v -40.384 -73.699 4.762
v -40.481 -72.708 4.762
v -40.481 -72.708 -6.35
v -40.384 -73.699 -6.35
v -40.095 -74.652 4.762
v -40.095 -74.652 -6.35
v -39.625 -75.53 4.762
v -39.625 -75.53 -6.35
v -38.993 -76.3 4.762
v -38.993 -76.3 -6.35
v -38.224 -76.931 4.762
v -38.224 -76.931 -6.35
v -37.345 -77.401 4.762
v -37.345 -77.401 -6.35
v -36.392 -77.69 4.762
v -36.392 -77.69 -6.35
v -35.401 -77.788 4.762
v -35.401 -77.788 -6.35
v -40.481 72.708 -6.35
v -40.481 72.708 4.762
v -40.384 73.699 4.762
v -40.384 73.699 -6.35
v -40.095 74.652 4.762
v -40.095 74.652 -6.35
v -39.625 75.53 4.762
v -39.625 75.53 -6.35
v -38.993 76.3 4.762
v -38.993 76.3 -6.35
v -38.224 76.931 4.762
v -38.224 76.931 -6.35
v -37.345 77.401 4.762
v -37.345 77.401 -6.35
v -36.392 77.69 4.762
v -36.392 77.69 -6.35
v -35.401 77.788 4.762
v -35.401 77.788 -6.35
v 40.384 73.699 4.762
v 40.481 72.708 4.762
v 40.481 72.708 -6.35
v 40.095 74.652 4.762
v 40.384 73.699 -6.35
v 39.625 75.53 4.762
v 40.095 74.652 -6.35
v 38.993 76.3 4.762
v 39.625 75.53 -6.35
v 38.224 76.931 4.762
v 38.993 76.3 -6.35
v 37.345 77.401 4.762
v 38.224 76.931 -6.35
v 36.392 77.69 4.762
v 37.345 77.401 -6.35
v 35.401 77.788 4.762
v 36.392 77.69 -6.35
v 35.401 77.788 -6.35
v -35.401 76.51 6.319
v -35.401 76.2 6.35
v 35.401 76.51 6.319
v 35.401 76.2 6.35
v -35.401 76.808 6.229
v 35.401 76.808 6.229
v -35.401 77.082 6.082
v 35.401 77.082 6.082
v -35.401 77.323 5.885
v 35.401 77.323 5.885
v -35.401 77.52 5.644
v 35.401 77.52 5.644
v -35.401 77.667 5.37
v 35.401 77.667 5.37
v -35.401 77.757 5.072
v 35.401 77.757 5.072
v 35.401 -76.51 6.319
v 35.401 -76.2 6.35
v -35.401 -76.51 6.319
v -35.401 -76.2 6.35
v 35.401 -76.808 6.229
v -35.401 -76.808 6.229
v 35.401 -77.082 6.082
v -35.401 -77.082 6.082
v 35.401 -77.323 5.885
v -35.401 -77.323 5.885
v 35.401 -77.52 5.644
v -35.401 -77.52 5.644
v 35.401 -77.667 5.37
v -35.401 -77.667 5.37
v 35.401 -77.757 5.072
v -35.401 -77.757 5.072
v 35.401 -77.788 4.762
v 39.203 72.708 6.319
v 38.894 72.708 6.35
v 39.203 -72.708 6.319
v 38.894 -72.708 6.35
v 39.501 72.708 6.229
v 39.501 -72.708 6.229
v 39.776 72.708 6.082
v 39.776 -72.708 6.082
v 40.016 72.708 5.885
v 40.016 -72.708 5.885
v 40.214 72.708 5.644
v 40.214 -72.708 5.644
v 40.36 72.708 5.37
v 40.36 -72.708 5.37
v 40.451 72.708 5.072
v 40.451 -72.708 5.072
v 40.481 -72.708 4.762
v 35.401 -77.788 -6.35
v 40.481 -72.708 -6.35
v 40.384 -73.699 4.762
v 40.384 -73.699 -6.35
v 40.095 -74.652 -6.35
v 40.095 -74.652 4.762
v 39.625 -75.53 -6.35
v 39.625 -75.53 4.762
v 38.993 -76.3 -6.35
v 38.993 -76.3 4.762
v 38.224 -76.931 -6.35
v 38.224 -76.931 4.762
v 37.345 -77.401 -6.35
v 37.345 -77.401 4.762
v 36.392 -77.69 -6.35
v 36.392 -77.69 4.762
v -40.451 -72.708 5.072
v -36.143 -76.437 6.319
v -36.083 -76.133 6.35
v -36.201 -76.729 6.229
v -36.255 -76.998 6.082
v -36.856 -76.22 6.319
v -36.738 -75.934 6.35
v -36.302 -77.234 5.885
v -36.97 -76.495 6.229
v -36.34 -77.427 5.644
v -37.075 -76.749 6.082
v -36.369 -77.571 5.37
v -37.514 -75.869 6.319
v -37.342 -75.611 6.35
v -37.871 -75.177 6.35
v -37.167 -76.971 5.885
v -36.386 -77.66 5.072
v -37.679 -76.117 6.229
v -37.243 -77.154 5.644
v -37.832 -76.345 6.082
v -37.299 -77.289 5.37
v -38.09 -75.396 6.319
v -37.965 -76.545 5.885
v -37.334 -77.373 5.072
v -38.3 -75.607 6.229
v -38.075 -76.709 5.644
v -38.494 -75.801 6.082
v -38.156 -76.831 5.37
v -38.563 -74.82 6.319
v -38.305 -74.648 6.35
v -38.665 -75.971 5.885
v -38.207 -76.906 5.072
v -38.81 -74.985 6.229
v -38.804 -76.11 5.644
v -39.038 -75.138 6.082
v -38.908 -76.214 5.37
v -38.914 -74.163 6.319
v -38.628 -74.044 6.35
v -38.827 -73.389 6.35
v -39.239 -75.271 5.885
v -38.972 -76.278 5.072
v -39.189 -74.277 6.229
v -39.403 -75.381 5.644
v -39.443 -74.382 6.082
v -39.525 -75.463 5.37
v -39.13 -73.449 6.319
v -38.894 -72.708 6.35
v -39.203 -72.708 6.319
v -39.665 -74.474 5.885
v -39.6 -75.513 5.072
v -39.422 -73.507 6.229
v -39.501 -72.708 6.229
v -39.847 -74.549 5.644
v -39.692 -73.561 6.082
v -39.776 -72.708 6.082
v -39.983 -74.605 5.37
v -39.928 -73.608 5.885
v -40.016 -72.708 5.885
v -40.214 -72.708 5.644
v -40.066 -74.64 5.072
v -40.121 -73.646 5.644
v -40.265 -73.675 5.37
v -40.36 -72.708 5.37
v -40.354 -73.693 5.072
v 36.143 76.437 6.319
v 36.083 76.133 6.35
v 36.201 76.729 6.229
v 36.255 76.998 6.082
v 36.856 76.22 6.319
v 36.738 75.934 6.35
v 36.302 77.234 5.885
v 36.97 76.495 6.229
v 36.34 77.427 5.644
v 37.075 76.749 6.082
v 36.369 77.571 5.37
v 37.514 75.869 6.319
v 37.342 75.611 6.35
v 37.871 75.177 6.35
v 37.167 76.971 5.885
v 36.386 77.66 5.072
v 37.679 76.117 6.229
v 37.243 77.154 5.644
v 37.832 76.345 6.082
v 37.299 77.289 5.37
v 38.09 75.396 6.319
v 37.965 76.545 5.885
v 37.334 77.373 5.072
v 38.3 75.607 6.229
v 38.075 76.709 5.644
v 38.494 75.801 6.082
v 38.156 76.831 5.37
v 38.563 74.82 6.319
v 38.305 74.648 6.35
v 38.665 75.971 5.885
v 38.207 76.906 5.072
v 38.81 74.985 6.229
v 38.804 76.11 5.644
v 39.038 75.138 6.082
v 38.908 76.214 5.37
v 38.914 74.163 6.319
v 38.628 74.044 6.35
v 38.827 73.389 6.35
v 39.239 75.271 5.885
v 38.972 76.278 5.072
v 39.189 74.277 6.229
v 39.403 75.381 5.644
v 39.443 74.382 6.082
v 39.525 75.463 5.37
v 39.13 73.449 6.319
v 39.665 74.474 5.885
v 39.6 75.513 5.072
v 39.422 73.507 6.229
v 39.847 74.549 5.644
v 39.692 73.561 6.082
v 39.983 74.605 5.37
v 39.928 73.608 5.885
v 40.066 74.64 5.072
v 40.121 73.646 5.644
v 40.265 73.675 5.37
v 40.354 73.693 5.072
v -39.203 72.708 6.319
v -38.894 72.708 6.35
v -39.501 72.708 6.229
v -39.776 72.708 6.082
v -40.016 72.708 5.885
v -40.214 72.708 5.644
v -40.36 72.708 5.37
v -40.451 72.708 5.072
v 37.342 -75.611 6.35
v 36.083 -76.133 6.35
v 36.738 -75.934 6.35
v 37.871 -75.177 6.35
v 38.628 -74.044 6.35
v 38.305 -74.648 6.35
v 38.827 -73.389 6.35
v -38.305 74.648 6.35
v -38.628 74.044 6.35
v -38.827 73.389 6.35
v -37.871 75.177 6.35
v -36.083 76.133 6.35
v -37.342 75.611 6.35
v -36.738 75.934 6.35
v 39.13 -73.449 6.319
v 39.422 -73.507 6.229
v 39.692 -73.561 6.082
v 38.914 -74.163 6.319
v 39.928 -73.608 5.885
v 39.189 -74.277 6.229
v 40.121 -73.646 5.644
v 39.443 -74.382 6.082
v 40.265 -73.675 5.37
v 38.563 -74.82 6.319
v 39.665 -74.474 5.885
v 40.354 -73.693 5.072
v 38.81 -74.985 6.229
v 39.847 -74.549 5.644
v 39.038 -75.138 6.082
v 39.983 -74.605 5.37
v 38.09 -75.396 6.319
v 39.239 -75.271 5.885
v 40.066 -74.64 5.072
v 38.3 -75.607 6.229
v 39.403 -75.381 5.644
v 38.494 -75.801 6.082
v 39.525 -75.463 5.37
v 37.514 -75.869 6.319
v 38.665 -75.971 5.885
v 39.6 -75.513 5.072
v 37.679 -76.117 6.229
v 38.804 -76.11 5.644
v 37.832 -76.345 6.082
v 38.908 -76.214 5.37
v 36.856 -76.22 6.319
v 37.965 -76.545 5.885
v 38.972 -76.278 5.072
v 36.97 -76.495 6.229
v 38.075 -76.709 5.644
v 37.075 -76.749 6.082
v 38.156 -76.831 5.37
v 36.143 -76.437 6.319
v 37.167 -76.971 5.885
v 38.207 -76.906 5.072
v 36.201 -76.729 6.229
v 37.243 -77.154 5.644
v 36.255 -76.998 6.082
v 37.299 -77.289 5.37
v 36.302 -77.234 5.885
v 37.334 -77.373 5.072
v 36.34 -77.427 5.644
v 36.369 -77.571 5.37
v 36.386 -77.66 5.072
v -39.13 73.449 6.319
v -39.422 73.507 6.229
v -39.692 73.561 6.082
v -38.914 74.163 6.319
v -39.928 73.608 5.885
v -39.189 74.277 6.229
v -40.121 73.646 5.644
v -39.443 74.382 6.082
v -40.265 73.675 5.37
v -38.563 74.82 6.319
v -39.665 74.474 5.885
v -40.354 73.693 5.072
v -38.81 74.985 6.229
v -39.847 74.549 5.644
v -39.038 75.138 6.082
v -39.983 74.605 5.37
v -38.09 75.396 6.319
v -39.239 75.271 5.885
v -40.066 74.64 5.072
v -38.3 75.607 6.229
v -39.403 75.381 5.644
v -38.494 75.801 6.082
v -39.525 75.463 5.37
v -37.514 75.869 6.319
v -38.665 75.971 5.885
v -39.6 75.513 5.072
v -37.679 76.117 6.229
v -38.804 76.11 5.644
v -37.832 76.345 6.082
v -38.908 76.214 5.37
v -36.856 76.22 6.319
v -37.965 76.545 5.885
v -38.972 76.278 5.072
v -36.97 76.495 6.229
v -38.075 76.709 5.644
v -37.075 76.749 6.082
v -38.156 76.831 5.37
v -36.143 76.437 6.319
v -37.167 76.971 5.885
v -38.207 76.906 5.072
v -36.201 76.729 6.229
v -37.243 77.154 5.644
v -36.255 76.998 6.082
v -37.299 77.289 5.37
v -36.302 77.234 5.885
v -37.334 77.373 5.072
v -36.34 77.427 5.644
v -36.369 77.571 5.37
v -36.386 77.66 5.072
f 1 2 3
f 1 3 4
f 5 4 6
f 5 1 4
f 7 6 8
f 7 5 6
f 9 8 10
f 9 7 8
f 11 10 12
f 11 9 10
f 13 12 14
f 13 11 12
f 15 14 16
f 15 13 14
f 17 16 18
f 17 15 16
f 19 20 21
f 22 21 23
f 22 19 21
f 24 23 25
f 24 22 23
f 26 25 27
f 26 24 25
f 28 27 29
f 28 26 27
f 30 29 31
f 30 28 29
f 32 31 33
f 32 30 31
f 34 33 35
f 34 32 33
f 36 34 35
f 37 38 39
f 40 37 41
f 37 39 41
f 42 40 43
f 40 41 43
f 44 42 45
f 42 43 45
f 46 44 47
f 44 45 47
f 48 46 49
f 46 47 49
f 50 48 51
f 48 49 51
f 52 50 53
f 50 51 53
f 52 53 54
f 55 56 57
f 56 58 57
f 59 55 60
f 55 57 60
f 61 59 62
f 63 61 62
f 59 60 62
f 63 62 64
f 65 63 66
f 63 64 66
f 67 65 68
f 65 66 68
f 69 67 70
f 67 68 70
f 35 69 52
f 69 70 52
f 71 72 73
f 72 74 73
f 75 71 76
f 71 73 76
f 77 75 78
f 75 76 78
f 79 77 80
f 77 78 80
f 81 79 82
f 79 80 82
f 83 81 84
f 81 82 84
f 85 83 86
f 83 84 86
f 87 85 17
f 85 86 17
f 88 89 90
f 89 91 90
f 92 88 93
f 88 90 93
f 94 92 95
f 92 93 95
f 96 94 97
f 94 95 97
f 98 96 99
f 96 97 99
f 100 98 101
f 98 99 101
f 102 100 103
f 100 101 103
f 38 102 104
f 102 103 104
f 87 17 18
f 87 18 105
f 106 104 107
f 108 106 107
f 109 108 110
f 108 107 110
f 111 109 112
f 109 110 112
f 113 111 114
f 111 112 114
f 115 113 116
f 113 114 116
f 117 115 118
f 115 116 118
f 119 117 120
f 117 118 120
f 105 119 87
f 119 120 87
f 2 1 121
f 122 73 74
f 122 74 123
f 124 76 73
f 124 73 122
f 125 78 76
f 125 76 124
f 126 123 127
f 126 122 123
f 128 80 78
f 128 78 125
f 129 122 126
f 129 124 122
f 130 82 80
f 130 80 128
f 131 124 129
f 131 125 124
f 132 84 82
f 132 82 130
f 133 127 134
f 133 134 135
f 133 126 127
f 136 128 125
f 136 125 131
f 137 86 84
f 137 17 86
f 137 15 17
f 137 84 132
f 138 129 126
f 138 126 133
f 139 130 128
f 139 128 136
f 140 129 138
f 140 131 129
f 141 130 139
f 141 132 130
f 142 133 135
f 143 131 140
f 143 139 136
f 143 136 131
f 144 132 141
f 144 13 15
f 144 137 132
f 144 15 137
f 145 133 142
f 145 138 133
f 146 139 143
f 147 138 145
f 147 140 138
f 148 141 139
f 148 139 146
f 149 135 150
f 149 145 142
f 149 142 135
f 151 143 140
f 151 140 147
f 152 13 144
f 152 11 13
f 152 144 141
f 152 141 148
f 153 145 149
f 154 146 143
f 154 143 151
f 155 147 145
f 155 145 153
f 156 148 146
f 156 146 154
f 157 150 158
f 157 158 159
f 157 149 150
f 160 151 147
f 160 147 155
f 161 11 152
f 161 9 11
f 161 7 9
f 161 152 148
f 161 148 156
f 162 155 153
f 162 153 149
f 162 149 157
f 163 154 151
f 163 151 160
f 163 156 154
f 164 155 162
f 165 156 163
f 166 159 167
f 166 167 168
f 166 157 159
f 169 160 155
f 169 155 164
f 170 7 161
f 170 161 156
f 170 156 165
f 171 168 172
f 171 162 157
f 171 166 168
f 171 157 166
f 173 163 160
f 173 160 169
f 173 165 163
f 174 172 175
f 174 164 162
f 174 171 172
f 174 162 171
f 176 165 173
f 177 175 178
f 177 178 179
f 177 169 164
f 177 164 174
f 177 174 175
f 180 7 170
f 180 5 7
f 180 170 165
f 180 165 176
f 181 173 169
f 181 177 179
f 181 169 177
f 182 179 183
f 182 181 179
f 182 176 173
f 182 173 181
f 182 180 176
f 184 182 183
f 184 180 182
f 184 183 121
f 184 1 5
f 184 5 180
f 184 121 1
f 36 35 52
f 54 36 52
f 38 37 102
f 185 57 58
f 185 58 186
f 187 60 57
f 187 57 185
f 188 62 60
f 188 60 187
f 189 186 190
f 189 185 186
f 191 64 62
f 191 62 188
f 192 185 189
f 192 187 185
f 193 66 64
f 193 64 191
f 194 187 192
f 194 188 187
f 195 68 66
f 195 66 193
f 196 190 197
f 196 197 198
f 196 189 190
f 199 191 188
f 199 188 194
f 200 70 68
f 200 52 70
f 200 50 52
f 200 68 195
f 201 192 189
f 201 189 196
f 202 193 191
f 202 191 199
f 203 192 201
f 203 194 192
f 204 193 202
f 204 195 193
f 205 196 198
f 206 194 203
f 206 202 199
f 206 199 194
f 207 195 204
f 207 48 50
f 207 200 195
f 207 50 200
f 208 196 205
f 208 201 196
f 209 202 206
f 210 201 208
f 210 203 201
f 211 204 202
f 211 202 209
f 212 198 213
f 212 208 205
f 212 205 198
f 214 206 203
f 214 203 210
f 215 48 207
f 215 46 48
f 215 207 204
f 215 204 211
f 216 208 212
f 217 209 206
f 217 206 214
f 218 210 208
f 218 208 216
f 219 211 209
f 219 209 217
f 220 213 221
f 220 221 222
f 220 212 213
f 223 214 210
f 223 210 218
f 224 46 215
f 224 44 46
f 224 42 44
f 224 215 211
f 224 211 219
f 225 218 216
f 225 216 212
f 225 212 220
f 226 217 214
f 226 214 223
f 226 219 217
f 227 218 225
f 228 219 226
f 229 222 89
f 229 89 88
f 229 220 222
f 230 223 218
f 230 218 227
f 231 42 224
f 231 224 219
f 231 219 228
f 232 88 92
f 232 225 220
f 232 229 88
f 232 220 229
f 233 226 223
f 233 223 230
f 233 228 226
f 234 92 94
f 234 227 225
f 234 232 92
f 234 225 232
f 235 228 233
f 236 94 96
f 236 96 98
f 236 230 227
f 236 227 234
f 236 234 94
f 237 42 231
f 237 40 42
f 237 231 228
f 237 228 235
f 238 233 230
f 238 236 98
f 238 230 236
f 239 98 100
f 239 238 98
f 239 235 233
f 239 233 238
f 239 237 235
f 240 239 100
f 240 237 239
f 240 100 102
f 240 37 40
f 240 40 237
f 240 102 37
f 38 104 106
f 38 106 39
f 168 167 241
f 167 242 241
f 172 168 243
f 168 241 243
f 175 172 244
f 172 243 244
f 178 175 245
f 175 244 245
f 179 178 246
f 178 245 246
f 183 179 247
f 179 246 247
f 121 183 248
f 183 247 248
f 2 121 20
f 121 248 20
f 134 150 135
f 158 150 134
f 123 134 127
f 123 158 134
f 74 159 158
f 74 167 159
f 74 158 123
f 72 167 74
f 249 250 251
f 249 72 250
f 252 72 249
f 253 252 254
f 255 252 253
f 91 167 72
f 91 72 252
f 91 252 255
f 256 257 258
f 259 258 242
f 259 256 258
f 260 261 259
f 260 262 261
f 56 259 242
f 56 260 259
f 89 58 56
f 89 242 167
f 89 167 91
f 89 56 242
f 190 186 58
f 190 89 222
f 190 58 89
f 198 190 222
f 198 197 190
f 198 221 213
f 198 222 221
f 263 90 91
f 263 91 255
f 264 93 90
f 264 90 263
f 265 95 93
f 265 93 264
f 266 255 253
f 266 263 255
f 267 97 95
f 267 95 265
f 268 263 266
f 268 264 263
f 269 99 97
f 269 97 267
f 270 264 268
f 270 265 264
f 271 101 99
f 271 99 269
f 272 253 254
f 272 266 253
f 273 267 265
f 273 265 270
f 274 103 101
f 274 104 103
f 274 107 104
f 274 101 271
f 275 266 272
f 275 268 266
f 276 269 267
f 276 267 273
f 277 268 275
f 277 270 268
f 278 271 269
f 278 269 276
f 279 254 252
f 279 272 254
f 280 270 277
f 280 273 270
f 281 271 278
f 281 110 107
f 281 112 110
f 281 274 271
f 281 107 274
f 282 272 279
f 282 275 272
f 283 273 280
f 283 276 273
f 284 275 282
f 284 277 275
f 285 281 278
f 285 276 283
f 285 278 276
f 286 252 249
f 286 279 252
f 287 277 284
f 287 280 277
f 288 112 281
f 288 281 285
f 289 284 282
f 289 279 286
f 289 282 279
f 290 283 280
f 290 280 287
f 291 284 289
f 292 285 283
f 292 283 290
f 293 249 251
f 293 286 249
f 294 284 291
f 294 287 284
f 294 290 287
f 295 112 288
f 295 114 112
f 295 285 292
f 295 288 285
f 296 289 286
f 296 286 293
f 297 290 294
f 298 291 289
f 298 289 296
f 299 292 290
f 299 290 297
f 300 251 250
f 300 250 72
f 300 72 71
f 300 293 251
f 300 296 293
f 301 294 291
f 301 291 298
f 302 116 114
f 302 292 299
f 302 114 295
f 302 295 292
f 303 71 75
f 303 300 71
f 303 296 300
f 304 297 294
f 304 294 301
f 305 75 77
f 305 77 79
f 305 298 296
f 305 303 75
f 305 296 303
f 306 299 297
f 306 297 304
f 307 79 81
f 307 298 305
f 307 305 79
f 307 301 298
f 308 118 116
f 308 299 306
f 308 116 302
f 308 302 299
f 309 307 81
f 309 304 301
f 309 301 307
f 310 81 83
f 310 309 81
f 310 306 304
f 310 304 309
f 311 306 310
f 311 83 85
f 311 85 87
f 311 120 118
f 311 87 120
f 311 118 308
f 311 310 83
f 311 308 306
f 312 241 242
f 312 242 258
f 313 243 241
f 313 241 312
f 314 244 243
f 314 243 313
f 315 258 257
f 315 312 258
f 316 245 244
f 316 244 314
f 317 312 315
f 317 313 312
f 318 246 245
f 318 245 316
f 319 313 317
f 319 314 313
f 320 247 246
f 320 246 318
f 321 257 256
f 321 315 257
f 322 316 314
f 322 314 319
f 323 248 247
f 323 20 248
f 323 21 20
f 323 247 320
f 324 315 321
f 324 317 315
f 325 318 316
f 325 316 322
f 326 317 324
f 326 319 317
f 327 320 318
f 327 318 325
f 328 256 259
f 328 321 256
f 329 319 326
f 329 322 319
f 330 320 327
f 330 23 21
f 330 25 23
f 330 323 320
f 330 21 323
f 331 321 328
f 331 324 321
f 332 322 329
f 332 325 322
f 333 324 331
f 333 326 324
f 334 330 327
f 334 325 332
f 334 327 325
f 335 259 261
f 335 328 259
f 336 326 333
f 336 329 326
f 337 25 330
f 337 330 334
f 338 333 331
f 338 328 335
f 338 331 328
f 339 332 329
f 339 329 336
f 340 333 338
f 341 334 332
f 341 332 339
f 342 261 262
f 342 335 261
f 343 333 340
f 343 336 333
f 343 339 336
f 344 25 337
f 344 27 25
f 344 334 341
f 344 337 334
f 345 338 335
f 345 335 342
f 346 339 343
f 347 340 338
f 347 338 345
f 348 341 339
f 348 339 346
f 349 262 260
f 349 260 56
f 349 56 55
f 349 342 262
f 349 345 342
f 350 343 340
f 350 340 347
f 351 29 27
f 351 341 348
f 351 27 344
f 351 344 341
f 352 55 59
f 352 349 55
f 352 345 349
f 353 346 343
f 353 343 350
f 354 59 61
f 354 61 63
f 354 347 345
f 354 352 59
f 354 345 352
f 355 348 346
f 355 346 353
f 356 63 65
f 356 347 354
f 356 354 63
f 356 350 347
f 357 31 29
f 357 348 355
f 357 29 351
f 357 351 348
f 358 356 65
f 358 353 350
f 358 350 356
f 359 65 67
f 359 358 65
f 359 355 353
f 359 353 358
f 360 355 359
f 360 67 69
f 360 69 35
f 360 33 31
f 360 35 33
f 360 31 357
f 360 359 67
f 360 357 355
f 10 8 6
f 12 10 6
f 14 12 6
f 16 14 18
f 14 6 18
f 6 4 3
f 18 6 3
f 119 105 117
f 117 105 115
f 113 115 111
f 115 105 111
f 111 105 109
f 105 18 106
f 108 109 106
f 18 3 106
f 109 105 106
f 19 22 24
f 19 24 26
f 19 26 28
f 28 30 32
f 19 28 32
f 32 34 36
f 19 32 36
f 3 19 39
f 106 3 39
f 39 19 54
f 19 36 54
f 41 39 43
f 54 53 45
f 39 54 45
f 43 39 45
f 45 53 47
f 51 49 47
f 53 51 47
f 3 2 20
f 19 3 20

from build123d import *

# Parameters (mm, degrees)
F0_W     = 80.9625
F0_H     = 155.575
F1_DEPTH = 6.35
F2_R     = 5.08
F3_R     = 1.5875


with BuildPart() as f1:
    # F0 (on Top) → F1 (new body, symmetric)
    with BuildSketch(Plane.XY):
        Rectangle(F0_W, F0_H)
    extrude(amount=F1_DEPTH, both=True)

    # F2
    f2_edges = [f1.edges().sort_by_distance(p)[0] for p in [
        (40.48125, -77.7875, 0),
        (-40.48125, -77.7875, 0),
        (40.48125, 77.7875, 0),
        (-40.48125, 77.7875, 0),
    ]]
    fillet(f2_edges, radius=F2_R)

    # F3
    f3_edges = [f1.edges().sort_by_distance(p)[0] for p in [
        (0, 77.7875, 6.35),
    ]]
    fillet(f3_edges, radius=F3_R)


solid = f1.part
